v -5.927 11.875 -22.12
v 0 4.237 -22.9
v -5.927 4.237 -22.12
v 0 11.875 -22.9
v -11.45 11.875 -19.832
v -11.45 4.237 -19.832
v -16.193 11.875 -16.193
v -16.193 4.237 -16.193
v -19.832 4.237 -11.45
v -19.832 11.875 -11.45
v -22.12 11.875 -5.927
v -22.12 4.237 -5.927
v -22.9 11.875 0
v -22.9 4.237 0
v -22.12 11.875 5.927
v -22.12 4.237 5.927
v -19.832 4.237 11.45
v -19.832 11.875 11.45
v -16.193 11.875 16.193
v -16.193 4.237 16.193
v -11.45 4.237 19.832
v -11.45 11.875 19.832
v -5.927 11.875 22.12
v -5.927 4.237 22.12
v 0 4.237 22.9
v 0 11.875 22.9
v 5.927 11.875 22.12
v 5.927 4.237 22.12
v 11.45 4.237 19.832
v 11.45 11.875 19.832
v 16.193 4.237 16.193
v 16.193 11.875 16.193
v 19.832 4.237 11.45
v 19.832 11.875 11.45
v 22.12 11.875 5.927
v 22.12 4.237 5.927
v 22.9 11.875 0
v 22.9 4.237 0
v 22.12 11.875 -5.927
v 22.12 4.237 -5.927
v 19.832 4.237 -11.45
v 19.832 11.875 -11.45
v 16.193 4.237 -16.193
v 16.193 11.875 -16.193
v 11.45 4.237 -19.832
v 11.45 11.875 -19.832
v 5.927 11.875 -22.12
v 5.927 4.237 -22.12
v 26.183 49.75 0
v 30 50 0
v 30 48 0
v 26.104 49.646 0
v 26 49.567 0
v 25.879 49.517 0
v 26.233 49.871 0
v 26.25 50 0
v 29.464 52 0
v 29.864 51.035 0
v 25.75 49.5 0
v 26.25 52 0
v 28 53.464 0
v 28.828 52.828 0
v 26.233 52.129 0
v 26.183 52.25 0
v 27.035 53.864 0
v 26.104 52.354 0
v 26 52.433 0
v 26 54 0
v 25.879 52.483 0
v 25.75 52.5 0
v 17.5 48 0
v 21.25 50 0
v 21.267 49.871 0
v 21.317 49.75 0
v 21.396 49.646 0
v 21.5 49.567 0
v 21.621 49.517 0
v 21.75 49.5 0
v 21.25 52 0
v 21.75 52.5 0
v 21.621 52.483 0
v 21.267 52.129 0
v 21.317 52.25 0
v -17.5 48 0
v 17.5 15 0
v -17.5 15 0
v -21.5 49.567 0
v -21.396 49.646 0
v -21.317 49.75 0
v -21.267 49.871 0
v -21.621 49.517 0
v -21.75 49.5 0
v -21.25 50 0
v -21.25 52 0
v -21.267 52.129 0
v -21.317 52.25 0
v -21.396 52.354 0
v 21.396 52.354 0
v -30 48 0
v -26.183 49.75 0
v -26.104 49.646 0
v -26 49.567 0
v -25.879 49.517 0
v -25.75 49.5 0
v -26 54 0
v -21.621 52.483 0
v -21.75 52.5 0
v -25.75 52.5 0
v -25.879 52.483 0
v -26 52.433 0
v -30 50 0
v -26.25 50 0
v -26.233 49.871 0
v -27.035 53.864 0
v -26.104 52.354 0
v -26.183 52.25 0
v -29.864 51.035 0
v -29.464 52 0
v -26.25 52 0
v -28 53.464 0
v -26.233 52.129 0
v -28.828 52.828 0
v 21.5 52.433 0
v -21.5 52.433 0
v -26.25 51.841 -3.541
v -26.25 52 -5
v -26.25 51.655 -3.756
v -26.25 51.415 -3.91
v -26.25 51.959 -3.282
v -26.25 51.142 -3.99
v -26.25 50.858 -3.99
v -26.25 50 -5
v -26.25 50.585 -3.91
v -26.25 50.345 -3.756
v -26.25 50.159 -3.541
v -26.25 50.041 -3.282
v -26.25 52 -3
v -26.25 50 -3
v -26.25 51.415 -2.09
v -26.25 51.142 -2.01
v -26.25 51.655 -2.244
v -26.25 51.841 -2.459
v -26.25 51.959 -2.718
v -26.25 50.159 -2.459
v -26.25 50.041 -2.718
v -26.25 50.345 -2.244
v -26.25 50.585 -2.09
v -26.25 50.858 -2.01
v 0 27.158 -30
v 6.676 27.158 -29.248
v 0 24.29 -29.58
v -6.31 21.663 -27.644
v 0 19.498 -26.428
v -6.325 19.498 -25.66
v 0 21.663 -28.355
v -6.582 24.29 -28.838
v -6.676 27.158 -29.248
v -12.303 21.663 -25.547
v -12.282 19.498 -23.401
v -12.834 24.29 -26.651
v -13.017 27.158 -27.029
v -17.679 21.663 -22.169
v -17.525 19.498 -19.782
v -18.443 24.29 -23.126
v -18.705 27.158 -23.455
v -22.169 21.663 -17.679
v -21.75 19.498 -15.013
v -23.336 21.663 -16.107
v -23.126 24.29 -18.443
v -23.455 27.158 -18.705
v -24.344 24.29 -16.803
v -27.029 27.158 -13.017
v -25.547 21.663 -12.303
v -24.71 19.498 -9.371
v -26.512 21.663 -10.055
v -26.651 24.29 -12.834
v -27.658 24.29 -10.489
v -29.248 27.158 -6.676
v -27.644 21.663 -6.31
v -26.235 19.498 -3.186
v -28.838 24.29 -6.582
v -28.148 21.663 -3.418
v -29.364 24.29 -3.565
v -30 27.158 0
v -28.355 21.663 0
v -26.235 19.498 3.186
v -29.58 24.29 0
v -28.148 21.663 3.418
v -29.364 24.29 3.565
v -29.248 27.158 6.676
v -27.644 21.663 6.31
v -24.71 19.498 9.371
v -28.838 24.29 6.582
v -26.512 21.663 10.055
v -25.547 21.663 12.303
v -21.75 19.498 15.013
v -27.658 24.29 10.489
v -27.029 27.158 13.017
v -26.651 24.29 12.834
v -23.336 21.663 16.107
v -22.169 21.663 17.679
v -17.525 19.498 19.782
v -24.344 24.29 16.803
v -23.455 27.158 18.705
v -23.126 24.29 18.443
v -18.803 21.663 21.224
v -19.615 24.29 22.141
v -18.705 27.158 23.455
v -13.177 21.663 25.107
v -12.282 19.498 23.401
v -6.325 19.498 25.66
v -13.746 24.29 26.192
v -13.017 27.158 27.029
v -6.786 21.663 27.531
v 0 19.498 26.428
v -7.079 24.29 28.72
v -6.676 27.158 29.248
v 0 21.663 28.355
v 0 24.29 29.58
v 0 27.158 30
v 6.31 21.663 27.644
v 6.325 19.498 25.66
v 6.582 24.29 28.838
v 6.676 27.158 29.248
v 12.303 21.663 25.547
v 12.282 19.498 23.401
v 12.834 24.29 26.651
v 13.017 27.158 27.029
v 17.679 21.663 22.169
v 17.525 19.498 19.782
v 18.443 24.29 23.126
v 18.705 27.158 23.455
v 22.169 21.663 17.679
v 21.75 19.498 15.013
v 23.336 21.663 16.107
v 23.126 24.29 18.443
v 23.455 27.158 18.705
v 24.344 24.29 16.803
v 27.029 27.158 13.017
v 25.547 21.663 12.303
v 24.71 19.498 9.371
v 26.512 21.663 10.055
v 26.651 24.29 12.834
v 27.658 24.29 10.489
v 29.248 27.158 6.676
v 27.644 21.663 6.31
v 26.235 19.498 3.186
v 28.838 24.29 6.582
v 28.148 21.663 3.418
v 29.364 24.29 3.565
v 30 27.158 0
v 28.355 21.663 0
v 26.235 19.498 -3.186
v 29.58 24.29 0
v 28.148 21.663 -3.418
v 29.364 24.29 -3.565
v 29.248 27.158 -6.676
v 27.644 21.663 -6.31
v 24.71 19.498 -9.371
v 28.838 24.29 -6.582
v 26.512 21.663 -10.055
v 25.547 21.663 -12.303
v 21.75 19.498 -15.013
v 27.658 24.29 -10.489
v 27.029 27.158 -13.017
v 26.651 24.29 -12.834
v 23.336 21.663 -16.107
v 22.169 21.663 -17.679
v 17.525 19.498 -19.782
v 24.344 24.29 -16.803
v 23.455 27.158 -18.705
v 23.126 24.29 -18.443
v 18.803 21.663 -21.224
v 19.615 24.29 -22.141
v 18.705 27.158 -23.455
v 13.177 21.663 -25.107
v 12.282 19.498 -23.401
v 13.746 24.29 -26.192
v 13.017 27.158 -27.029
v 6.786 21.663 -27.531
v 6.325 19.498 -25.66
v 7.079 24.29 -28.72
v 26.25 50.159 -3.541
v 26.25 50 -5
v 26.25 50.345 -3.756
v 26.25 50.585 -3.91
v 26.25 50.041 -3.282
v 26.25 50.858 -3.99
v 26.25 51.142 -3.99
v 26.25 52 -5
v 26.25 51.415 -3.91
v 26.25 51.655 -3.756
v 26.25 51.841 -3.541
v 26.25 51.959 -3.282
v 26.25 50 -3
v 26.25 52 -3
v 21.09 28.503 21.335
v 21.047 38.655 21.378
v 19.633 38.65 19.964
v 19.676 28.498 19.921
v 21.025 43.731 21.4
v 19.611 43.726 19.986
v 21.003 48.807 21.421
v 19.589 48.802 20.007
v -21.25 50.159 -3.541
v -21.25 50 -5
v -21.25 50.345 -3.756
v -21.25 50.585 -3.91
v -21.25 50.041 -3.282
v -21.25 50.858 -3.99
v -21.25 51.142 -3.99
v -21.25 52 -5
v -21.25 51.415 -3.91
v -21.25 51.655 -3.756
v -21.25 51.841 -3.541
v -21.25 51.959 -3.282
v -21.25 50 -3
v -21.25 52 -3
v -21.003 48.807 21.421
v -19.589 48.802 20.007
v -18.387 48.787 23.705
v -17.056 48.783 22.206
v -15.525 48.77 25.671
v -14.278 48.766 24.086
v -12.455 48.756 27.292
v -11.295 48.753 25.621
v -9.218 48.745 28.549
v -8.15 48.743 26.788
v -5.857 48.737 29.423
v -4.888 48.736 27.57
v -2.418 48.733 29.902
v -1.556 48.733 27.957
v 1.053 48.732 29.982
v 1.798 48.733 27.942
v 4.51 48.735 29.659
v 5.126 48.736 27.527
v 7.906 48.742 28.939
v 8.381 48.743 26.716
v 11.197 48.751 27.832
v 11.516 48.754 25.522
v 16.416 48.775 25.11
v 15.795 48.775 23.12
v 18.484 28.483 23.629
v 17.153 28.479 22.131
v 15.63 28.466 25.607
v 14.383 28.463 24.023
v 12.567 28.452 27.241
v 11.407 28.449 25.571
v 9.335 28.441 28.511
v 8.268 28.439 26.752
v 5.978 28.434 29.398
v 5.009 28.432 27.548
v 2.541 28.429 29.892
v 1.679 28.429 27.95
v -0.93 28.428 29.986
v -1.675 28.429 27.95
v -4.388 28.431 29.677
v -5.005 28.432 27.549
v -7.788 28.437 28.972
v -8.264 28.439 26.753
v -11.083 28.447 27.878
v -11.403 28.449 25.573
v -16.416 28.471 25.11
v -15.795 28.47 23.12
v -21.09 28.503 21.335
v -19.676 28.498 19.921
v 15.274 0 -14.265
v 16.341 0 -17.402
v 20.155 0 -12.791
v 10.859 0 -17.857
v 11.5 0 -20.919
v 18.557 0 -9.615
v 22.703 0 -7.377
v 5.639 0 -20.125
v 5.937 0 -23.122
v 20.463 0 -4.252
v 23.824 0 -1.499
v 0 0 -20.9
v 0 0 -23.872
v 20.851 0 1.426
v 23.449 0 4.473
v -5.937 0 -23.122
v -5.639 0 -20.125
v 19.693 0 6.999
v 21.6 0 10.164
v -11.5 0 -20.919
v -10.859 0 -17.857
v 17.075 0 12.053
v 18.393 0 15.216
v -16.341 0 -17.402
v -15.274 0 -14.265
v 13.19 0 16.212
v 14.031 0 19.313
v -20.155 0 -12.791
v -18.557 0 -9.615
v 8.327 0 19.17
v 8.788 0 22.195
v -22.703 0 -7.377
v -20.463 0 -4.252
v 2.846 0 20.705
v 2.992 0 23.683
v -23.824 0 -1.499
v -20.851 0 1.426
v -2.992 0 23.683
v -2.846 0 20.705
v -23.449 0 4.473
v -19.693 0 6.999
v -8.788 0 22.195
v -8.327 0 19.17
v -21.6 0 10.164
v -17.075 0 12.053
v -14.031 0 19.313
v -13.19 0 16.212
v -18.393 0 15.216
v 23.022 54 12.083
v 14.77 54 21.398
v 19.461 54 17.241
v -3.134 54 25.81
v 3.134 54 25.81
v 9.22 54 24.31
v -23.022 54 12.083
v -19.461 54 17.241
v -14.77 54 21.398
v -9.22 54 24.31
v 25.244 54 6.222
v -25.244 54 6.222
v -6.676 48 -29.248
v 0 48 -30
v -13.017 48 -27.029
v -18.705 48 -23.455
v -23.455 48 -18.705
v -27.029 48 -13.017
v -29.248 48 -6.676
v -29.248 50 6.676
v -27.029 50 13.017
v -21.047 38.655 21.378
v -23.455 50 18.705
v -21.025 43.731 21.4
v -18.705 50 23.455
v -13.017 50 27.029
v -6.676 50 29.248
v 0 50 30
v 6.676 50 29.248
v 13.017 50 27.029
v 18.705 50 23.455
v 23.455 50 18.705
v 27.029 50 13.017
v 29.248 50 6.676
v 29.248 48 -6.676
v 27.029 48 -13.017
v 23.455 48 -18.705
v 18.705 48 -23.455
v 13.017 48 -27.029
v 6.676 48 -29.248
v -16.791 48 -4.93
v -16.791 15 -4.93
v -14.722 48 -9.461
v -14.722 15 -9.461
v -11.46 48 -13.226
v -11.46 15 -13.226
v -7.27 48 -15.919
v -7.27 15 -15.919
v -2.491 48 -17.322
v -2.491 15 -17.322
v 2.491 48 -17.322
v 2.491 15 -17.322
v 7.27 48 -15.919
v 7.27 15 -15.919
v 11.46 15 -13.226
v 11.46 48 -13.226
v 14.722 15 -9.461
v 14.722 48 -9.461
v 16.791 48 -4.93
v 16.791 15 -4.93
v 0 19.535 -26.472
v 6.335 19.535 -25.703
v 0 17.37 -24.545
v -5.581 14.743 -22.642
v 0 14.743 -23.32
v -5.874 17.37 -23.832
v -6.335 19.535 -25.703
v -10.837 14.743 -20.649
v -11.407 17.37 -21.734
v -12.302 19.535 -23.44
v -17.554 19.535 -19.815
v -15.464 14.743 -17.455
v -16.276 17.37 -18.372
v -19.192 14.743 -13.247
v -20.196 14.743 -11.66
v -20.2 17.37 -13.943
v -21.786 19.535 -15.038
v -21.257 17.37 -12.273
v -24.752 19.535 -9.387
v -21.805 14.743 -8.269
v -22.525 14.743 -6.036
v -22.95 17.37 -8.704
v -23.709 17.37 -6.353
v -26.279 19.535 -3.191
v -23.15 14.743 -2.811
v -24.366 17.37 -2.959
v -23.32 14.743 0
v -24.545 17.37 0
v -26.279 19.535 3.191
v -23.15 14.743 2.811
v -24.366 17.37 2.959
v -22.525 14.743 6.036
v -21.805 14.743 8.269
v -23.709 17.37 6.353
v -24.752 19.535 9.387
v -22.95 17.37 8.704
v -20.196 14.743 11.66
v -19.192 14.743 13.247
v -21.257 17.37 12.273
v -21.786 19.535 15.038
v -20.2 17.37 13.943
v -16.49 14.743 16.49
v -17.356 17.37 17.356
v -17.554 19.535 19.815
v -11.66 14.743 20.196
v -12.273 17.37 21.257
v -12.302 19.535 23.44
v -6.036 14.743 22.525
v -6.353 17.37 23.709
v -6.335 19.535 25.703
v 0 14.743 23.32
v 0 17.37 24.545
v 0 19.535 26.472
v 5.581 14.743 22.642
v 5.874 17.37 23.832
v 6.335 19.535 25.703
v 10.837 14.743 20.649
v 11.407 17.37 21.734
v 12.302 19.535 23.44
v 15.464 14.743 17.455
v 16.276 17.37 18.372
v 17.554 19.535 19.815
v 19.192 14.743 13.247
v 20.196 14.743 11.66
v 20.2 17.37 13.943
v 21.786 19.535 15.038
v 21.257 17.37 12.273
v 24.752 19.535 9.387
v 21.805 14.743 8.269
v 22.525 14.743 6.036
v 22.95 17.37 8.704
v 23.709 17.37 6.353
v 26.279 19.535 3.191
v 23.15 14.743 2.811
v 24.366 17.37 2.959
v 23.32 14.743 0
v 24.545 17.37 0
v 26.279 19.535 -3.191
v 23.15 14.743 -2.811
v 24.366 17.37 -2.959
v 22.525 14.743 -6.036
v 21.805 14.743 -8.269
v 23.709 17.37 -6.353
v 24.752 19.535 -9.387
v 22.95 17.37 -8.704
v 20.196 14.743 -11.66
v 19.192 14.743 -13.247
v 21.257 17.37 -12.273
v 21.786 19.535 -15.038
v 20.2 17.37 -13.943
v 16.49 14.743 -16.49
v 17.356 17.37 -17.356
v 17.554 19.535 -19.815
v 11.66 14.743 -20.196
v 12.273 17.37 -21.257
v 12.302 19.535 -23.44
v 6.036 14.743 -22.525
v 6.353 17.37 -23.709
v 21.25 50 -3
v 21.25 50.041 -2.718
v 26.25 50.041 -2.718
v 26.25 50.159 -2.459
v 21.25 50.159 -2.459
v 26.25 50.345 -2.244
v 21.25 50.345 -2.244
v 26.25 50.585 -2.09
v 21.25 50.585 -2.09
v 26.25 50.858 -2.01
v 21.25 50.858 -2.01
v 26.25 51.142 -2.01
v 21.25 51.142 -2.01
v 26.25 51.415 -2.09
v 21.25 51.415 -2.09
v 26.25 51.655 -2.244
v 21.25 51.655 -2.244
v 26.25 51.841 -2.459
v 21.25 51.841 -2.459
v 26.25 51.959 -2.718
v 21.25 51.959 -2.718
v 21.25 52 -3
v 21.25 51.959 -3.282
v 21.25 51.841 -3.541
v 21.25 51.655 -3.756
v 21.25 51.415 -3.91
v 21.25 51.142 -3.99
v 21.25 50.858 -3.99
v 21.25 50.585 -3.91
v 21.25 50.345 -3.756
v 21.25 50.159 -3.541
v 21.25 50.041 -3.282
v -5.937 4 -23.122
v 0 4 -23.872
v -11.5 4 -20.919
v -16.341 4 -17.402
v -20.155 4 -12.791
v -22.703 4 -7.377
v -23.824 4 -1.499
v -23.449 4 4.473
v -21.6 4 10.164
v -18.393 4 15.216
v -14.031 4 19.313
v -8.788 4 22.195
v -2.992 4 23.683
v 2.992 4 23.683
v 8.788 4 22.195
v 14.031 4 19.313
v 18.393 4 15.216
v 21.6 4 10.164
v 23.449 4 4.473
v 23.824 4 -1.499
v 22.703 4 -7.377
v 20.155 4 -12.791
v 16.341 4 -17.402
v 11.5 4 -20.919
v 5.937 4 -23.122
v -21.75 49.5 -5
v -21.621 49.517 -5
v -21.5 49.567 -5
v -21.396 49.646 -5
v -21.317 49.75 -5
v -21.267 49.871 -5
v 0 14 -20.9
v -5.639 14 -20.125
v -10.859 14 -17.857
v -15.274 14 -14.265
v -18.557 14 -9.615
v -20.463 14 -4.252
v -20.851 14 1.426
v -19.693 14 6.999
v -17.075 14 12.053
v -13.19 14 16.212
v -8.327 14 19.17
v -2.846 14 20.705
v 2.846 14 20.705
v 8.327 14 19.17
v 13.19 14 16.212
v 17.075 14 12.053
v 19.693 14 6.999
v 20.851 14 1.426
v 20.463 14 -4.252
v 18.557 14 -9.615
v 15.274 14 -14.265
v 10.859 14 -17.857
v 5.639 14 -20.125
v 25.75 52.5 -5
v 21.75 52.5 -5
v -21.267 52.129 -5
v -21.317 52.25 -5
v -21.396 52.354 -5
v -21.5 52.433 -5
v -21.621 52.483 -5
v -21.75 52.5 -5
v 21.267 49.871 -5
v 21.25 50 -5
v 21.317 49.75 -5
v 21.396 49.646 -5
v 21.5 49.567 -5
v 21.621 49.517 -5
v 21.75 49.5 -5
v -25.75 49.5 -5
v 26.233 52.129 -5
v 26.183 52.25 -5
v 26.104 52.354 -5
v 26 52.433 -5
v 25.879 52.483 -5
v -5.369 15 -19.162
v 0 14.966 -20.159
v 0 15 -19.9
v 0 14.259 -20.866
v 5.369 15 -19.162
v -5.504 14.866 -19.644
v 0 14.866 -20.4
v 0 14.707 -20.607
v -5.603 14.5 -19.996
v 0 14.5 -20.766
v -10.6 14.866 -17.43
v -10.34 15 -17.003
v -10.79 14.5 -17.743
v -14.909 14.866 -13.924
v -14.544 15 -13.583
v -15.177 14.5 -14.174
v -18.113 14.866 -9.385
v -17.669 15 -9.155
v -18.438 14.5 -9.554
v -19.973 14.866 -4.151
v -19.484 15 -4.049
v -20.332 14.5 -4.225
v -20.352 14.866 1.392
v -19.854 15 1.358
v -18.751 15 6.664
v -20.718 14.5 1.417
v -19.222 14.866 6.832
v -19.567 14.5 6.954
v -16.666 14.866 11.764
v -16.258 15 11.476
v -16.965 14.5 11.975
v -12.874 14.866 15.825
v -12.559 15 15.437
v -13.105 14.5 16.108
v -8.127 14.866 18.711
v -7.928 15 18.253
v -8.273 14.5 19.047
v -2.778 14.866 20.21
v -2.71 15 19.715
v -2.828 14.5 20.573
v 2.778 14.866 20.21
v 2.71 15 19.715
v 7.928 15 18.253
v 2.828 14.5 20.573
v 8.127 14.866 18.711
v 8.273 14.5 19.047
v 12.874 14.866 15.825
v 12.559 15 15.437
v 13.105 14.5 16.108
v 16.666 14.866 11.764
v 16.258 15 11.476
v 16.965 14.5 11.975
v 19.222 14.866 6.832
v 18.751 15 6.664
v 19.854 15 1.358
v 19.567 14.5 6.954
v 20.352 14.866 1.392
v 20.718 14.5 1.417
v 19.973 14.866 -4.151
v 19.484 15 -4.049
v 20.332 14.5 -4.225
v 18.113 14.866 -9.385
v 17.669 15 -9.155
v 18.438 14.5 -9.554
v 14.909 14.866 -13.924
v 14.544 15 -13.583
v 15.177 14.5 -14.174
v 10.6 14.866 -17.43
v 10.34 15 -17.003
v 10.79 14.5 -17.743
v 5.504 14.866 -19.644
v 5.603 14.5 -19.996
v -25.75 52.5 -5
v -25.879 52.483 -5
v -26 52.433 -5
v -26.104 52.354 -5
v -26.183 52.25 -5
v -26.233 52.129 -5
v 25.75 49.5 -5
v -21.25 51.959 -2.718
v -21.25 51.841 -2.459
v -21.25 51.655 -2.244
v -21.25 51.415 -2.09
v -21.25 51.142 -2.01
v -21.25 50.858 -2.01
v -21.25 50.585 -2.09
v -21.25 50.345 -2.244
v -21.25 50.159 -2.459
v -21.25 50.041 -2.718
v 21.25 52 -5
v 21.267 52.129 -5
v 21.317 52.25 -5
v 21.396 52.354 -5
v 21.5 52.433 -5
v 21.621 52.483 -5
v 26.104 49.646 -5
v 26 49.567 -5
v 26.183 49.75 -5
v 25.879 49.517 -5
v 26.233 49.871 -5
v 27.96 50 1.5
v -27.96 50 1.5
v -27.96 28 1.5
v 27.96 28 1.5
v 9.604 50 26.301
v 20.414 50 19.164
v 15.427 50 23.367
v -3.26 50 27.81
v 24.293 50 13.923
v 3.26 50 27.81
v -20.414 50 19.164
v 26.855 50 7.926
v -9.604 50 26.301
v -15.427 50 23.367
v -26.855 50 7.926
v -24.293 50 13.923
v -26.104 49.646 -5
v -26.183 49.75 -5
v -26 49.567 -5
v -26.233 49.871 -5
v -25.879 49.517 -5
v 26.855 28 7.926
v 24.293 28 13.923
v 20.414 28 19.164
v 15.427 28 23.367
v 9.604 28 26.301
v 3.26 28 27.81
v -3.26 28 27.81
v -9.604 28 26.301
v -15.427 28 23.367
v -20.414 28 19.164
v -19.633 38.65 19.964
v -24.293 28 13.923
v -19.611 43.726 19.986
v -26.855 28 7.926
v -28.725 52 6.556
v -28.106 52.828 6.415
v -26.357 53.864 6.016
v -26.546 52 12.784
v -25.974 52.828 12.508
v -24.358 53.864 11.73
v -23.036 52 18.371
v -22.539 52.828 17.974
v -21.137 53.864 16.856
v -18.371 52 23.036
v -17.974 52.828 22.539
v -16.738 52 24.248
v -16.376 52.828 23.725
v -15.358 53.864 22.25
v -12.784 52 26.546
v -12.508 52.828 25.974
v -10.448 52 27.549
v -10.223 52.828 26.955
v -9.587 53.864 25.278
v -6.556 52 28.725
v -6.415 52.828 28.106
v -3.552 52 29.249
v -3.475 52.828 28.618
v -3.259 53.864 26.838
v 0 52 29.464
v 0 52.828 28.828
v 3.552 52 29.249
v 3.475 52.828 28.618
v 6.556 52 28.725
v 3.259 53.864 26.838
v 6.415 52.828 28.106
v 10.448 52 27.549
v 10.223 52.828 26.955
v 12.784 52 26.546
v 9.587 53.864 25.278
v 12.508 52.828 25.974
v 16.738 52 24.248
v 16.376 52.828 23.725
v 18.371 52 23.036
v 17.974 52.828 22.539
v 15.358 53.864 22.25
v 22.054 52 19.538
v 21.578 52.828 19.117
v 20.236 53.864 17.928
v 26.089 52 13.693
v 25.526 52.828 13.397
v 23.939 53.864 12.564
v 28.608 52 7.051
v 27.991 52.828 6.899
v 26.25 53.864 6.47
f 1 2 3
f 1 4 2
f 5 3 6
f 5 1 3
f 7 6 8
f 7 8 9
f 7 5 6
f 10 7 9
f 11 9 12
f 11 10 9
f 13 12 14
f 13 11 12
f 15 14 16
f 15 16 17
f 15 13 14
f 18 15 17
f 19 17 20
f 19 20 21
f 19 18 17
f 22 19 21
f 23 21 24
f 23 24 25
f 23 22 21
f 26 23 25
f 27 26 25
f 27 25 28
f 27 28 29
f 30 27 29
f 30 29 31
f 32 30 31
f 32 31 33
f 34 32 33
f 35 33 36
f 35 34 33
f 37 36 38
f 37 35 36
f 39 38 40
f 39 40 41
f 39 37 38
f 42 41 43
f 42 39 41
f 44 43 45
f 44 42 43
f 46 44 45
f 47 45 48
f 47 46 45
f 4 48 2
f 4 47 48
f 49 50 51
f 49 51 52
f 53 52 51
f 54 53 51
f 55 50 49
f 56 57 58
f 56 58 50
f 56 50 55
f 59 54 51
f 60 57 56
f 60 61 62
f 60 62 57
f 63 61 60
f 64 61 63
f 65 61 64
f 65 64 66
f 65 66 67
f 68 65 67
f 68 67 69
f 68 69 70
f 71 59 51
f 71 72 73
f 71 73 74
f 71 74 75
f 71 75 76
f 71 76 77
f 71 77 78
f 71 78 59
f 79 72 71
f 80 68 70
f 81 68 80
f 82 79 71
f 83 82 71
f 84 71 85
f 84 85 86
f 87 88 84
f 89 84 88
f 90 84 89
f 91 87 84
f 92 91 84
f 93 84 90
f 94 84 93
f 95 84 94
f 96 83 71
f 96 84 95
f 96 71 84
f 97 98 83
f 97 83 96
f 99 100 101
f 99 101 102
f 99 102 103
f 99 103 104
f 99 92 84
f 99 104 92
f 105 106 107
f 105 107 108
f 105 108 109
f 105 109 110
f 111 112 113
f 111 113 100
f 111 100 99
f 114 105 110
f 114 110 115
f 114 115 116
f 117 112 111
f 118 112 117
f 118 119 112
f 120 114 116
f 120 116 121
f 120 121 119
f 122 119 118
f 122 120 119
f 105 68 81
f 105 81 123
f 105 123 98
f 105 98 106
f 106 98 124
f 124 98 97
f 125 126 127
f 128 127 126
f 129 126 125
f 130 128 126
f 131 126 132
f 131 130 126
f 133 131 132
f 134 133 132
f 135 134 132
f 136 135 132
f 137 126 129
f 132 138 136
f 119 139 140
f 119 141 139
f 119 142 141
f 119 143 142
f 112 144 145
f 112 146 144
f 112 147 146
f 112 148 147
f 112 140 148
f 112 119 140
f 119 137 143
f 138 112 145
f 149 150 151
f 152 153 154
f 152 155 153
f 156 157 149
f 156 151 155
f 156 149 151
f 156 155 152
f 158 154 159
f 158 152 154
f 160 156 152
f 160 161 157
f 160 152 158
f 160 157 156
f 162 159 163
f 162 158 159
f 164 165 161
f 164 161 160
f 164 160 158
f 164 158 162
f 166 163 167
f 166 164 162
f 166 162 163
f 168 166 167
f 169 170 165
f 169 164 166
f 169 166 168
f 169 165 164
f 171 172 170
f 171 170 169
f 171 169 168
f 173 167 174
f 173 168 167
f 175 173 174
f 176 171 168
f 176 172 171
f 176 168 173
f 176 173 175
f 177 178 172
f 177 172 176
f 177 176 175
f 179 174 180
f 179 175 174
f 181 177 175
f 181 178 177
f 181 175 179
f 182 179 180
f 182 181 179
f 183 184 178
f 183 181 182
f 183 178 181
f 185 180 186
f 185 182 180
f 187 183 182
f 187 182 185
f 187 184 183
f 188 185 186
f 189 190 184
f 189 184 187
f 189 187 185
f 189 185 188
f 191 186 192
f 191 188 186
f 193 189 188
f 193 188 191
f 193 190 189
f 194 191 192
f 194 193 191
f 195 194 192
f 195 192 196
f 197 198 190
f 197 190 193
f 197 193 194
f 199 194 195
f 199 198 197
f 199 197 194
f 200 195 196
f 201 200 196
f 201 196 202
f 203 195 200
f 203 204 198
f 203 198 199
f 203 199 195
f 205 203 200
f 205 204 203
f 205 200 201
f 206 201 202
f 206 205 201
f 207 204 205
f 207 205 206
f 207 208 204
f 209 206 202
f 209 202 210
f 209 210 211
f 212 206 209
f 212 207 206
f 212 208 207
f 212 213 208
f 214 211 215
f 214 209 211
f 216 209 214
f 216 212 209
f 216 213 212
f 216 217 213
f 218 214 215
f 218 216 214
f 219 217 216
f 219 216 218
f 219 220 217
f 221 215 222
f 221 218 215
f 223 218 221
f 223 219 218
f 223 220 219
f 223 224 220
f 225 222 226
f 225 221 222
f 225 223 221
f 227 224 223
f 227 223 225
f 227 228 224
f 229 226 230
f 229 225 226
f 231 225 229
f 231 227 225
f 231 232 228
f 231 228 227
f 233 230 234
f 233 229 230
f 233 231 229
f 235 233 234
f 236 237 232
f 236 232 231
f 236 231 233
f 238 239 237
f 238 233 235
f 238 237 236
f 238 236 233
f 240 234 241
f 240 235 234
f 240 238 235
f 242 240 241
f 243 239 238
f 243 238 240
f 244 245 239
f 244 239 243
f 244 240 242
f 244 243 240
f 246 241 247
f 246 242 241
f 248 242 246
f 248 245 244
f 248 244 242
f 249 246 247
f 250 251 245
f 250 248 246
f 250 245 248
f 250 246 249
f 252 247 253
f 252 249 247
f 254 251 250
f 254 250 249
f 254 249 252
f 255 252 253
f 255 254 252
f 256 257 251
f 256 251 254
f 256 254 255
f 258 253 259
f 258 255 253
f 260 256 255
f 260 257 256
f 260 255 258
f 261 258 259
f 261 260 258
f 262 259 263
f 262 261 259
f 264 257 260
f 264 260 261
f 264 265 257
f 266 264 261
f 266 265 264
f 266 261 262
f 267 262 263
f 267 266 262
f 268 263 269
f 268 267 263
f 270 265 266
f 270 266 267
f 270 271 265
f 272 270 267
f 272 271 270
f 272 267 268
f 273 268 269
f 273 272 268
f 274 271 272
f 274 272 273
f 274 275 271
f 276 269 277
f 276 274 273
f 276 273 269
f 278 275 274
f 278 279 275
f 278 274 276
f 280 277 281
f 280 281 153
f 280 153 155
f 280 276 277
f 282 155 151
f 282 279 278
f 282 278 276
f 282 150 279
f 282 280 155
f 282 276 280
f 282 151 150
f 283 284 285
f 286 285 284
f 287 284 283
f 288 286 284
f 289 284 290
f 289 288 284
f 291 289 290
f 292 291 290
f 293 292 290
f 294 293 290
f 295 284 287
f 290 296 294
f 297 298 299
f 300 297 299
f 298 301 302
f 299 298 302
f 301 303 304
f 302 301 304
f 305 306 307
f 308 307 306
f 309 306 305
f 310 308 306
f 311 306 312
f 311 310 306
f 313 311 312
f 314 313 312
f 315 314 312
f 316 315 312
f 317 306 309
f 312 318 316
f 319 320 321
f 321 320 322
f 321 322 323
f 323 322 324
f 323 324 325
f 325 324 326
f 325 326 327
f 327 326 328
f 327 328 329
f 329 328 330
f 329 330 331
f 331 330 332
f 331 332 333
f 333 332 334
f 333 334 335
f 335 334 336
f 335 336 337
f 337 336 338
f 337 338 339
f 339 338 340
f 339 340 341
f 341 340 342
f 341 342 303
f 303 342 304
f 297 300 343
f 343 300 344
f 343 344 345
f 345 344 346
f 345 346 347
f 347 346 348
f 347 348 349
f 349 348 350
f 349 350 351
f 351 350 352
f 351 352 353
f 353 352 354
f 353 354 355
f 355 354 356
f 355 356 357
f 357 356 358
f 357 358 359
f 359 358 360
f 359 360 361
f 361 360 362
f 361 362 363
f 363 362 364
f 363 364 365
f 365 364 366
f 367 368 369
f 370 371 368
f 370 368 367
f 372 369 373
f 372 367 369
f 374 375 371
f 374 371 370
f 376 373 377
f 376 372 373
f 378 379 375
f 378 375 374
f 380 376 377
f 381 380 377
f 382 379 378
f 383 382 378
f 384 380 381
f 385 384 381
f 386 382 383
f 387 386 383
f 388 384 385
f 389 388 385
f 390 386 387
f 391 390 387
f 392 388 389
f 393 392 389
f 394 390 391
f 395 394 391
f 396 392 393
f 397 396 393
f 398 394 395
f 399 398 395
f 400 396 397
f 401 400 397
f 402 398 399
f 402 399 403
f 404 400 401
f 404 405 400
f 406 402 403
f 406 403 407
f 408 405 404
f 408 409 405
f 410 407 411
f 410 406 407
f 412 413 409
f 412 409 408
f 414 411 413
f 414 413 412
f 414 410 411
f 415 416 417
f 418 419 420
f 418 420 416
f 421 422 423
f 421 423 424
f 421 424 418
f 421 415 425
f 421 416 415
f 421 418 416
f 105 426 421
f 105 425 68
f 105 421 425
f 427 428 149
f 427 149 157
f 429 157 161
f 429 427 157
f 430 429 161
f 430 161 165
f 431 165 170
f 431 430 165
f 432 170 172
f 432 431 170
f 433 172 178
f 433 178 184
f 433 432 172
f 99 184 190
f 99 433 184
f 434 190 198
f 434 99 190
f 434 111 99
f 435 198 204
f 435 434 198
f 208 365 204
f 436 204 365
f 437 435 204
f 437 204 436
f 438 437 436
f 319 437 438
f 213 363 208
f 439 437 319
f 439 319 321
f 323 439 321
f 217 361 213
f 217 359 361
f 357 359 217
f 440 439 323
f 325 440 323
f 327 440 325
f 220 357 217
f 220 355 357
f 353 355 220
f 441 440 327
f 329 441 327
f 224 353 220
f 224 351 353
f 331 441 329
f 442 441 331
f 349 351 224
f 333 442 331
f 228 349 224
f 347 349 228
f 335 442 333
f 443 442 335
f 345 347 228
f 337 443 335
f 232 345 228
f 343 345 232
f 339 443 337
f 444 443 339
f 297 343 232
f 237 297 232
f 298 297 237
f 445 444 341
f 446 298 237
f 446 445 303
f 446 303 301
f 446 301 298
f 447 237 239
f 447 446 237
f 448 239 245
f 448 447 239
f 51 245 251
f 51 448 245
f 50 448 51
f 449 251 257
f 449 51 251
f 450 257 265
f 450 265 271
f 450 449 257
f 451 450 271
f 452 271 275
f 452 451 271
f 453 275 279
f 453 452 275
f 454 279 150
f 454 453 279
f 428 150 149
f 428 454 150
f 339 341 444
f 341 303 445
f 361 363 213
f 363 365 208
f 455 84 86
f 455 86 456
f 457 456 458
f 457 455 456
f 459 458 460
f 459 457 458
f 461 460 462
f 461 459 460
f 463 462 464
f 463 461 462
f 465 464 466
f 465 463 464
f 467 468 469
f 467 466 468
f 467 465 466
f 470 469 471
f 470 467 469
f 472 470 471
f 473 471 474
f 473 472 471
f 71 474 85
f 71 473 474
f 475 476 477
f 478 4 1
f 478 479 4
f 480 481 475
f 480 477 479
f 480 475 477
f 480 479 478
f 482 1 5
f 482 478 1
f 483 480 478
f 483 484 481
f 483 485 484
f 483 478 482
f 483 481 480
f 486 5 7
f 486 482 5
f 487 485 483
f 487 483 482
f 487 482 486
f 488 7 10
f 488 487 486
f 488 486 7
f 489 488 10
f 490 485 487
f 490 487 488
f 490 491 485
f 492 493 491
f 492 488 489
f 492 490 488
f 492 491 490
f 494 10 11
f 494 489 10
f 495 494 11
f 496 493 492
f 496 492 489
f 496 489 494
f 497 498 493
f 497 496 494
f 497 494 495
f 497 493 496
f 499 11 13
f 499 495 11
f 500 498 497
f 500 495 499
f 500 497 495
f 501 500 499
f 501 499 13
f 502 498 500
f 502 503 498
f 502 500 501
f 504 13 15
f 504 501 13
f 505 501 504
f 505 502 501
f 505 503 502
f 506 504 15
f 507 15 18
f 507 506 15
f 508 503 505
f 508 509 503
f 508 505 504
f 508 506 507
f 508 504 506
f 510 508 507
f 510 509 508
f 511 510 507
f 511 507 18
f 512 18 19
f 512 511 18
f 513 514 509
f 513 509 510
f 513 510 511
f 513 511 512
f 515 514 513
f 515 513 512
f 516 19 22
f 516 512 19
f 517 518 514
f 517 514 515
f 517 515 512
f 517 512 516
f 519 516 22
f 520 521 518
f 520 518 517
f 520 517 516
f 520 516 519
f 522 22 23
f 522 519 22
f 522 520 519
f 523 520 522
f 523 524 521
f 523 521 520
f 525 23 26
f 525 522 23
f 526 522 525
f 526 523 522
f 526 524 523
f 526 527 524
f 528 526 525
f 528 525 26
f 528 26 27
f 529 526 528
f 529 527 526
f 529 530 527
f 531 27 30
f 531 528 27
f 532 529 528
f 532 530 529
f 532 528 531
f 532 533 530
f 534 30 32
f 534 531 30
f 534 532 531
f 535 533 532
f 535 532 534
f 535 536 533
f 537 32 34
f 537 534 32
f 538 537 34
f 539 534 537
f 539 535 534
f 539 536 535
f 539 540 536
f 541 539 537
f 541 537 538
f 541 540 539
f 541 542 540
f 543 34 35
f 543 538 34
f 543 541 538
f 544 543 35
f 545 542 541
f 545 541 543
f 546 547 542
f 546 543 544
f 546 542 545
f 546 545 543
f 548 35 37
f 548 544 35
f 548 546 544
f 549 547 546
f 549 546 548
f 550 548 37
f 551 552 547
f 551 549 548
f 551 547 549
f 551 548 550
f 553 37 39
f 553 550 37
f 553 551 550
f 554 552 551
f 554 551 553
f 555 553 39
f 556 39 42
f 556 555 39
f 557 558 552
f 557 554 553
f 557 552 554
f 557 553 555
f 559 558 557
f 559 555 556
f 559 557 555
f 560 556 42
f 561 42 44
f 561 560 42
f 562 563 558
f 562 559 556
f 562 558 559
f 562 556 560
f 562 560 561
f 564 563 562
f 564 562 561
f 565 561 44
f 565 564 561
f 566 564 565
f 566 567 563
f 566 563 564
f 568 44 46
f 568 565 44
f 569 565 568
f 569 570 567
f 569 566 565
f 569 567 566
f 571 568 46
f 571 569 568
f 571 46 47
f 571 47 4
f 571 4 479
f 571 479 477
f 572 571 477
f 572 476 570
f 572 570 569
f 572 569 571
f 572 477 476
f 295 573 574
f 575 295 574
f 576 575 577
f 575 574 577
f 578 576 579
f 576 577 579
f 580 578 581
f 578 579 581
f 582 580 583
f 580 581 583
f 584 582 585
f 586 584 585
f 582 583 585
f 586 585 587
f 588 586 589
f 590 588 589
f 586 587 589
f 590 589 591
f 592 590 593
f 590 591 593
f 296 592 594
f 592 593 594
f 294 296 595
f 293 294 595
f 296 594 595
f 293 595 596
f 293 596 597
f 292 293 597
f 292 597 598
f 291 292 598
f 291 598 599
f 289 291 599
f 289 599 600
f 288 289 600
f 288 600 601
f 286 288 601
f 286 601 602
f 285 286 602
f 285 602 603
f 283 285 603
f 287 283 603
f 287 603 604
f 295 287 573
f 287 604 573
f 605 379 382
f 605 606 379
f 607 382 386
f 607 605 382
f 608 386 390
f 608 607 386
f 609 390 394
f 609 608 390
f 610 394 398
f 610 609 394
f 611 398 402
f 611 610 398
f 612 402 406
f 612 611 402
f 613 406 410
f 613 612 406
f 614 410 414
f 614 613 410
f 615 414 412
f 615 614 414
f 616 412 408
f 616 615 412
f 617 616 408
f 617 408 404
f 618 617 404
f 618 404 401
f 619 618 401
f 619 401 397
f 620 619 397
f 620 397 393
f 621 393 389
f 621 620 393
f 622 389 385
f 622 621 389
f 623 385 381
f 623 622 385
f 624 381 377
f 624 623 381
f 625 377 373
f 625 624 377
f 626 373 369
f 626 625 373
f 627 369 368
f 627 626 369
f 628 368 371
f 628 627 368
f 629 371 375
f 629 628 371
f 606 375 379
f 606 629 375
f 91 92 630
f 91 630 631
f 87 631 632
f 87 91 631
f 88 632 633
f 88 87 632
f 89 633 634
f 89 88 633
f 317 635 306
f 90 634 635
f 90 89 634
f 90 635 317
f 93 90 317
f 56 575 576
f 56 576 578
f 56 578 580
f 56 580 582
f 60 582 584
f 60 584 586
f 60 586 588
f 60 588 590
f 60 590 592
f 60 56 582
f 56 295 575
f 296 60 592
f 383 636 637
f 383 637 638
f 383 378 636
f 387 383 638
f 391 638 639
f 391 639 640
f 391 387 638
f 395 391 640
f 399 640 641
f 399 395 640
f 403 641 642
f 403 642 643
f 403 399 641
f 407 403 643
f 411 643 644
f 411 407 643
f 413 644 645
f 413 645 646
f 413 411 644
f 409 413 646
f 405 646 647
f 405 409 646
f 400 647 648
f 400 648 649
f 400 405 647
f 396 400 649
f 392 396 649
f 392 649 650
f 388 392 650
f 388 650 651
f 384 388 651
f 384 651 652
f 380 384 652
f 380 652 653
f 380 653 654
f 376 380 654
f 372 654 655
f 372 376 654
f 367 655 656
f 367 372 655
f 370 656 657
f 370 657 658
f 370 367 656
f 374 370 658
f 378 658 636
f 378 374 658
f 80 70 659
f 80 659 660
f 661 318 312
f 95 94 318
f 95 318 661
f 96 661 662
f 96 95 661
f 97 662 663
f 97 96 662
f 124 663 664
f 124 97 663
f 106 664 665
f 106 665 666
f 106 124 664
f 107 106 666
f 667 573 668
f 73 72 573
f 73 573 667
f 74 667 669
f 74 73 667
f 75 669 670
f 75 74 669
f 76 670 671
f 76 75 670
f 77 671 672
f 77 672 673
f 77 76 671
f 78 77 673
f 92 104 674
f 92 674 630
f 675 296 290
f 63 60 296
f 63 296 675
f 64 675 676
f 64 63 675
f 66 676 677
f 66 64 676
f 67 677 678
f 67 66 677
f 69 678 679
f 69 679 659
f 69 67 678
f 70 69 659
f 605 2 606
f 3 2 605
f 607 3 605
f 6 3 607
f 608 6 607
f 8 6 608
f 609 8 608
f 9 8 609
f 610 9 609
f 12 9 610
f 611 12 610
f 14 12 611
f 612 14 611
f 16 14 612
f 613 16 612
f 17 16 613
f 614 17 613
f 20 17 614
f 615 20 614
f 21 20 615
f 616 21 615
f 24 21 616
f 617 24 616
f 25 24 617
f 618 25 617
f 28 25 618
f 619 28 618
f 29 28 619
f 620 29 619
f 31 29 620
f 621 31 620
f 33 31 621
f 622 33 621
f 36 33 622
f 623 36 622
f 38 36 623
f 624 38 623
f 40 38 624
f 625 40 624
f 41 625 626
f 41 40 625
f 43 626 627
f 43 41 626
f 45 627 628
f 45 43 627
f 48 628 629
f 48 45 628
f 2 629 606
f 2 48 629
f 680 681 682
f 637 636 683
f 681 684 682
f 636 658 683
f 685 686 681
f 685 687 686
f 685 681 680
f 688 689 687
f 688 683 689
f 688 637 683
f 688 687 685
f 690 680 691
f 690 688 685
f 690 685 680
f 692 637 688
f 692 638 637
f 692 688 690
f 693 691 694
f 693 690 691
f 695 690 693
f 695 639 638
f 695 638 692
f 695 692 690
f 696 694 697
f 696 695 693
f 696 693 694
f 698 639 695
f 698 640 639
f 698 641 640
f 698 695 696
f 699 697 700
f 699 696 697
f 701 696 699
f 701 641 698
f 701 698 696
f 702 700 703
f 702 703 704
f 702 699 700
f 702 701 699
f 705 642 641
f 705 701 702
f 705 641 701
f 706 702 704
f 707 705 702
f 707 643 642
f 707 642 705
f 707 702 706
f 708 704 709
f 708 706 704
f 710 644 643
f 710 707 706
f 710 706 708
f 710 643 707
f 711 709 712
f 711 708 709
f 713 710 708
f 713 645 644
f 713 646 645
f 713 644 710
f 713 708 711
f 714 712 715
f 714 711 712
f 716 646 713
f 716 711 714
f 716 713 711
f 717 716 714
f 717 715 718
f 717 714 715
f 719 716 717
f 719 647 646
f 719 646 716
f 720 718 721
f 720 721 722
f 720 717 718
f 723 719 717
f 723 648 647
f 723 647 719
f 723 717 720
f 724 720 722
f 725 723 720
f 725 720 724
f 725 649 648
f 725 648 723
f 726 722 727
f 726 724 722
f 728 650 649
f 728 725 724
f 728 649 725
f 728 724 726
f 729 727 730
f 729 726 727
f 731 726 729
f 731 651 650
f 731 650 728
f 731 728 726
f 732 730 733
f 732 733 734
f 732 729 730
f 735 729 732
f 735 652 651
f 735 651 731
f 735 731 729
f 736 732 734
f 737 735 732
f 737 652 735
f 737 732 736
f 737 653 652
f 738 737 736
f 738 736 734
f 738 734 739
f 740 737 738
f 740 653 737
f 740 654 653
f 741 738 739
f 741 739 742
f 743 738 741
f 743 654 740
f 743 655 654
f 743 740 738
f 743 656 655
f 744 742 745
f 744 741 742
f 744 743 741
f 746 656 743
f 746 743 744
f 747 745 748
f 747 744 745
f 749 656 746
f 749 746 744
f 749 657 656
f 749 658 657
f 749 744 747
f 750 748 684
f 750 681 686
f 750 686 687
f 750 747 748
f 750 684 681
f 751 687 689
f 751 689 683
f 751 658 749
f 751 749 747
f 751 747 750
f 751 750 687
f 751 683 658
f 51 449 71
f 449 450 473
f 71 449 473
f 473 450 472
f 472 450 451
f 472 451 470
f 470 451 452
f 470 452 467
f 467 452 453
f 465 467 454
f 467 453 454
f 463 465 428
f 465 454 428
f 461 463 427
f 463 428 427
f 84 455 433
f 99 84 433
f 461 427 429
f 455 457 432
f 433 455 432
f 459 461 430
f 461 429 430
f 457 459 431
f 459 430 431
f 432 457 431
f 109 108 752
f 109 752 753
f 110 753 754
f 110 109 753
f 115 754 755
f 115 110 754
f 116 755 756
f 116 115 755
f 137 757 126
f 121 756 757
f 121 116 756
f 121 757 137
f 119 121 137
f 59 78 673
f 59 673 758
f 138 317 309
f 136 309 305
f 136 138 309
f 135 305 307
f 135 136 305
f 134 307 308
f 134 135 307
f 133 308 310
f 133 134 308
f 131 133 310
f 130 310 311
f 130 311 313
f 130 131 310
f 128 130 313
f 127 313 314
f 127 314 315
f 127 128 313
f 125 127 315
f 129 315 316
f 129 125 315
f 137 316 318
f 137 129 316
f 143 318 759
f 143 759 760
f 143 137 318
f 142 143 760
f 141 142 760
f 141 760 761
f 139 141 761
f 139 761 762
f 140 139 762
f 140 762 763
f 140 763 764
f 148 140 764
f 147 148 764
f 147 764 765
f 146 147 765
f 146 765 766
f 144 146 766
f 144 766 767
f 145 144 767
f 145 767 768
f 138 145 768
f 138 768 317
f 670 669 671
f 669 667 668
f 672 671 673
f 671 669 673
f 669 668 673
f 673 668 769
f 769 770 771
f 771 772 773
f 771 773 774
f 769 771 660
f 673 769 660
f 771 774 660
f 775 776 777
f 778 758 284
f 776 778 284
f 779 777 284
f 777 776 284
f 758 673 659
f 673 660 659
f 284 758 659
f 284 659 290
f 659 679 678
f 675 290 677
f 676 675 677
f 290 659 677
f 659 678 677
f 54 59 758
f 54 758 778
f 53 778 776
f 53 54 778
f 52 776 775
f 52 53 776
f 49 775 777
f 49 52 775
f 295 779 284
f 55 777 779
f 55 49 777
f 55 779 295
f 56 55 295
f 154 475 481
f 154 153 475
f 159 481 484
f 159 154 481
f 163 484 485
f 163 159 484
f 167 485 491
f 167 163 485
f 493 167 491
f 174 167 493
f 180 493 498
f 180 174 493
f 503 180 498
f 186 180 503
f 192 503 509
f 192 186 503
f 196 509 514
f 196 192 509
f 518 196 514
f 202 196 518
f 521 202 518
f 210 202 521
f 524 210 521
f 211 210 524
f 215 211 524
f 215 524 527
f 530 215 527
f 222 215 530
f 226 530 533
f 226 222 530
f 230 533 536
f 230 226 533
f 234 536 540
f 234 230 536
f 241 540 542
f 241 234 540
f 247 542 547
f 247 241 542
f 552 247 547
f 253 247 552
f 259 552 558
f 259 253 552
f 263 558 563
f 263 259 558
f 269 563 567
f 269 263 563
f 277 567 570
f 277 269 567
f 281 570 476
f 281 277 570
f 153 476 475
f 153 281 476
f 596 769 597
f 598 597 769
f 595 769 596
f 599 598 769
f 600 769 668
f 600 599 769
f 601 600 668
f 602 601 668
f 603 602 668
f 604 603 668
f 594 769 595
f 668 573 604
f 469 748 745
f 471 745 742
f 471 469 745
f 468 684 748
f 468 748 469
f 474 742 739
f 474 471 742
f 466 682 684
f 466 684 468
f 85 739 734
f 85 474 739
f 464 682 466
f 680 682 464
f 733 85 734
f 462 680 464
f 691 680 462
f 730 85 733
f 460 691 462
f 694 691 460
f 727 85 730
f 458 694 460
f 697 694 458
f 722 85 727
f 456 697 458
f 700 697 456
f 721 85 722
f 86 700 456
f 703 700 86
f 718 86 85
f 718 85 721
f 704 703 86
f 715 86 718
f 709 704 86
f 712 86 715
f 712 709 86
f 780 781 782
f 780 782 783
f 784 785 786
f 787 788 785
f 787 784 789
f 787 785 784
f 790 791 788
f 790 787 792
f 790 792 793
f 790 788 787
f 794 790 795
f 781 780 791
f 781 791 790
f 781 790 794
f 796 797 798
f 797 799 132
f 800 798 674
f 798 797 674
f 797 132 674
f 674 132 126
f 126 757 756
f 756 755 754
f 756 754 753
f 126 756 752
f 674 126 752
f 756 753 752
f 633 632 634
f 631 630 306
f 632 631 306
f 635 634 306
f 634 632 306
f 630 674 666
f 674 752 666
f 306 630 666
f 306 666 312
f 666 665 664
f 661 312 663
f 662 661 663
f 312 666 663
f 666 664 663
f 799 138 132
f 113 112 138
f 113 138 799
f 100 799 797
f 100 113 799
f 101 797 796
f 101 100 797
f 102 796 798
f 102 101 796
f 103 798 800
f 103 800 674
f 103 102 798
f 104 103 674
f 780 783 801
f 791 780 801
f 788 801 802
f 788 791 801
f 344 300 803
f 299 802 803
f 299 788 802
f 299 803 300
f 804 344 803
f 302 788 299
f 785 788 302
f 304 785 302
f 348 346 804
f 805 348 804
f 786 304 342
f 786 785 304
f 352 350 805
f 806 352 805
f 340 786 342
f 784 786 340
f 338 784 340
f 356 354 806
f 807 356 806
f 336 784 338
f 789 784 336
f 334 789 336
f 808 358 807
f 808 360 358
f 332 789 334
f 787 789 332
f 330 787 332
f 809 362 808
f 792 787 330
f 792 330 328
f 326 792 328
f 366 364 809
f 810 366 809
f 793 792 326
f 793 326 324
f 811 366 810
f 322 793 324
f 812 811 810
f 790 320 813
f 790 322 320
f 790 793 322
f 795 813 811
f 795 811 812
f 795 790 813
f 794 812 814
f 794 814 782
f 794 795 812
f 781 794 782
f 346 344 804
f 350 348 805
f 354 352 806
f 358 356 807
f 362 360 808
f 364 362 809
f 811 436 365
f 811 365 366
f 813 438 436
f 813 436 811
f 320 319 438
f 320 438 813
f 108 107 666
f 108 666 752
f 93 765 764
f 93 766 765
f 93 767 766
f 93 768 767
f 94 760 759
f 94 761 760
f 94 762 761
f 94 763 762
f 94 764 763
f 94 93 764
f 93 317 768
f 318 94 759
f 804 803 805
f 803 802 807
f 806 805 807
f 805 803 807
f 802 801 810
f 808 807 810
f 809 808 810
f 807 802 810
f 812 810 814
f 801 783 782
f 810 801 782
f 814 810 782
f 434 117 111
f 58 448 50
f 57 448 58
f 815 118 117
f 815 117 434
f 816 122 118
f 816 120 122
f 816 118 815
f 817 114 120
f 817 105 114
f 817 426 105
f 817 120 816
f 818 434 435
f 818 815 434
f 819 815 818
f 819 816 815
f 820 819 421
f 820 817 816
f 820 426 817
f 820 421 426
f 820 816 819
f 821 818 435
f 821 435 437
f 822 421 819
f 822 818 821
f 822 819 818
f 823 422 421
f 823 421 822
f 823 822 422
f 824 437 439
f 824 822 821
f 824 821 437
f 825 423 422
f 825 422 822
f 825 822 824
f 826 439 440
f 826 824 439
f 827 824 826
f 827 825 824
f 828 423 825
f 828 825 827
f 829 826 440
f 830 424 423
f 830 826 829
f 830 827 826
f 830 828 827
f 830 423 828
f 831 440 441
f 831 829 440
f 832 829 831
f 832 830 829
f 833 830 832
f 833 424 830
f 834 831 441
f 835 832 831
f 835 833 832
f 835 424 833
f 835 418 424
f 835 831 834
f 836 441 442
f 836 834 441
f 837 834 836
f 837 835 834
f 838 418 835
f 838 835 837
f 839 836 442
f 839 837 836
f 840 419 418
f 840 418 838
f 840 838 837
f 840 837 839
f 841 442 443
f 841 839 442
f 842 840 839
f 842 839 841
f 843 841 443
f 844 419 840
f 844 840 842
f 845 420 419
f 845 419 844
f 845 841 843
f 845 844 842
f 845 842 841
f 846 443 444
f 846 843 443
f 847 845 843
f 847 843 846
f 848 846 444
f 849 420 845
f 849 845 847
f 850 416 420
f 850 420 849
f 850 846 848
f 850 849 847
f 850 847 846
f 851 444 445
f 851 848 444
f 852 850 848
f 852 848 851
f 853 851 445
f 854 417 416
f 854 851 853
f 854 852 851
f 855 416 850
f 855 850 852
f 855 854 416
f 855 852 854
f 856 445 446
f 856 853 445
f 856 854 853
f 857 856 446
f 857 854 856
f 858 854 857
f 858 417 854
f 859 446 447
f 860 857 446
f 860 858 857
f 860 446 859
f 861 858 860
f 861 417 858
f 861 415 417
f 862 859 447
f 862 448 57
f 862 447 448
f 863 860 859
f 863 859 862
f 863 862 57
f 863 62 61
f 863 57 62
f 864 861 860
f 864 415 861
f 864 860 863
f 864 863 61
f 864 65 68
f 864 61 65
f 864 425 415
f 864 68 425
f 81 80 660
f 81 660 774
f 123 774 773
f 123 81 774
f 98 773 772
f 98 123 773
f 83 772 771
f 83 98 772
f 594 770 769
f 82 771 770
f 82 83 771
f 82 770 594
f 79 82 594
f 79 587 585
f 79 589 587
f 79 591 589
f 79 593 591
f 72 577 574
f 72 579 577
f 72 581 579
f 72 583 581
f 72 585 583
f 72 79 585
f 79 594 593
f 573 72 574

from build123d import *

# Parameters (mm, degrees)
CUT_EXTRUDE3_DEPTH           = 25
CUT_EXTRUDE3_DEPTH_BACK      = 40
CUT_EXTRUDE5_DEPTH           = 2
CUT_EXTRUDE5_DEPTH_BACK      = 5
BOSS_EXTRUDE2_DEPTH          = 5
CUT_EXTRUDE6_DEPTH           = 22
SKETCH17_W                   = 7
SKETCH17_H                   = 20.303986046
CUT_REVOLVE1_ANGLE           = 45
CUT_REVOLVE1_OTHER_WAY_ANGLE = 45
SKETCH14_R                   = 1
CUT_EXTRUDE7_DEPTH           = 10
CUT_EXTRUDE8_START           = -10
SKETCH15_R                   = 1
CUT_EXTRUDE8_DEPTH           = 10


with BuildPart() as part:
    # Sketch1 → Revolve1 (revolve)
    with BuildSketch(Plane.XY, mode=Mode.PRIVATE) as revolve1_sk:
        with BuildLine():
            Line((20.9, 0), (23.871591838, 0))
            Line((23.871591838, 0), (23.871591838, 4))
            Line((23.871591838, 4), (22.9, 4.236662843))
            Line((22.9, 4.236662843), (22.9, 11.874576818))
            ThreePointArc((22.9, 11.874576818), (23.83692213, 16.100759435), (26.472123903, 19.535021249))
            Line((26.472123903, 19.535021249), (26.427876097, 19.497892931))
            ThreePointArc((26.427876097, 19.497892931), (29.06307787, 22.932154745), (30, 27.158337362))
            Line((30, 27.158337362), (30, 50))
            ThreePointArc((30, 50), (28.828427125, 52.828427125), (26, 54))
            Line((26, 54), (0, 54))
            Line((0, 54), (0, 15))
            Line((0, 15), (19.9, 15))
            ThreePointArc((19.9, 15), (20.607106781, 14.707106781), (20.9, 14))
            Line((20.9, 14), (20.9, 0))
        make_face()
    revolve(revolve1_sk.sketch.rotate(Axis((0, 0, 0), (0, 1, 0)), 90), axis=Axis((0, 0, 0), (0, 1, 0)))

    # Sketch11 → Cut-Extrude3 (cut, two sides: drawn at the far end of the back side and taken through both)
    with BuildSketch(Plane(origin=(0, 19.535021249, 0), x_dir=(-1, 0, 0), z_dir=(0, -1, 0)).offset(-CUT_EXTRUDE3_DEPTH_BACK)):
        with BuildLine():
            Line((-17.5, 0), (17.5, 0))
            ThreePointArc((17.5, 0), (0, 17.5), (-17.5, 0))
        make_face()
    extrude(amount=CUT_EXTRUDE3_DEPTH + CUT_EXTRUDE3_DEPTH_BACK, mode=Mode.SUBTRACT)

    # Sketch9 → Cut-Extrude5 (cut, two sides: drawn at the far end of the back side and taken through both)
    with BuildSketch(Plane(origin=(0, 50, 0), x_dir=(-1, 0, 0), z_dir=(0, -1, 0)).offset(-CUT_EXTRUDE5_DEPTH_BACK)):
        with BuildLine():
            Line((-30, 0), (30, 0))
            ThreePointArc((30, 0), (0, 30), (-30, 0))
        make_face()
    extrude(amount=CUT_EXTRUDE5_DEPTH + CUT_EXTRUDE5_DEPTH_BACK, mode=Mode.SUBTRACT)

    # Sketch13 → Boss-Extrude2 (add)
    with BuildSketch(Plane(origin=(0, 0, 0), x_dir=(-1, 0, 0), z_dir=(0, 0, -1))):
        with BuildLine():
            Line((21.75, 52.5), (25.75, 52.5))
            ThreePointArc((25.75, 52.5), (26.103553391, 52.353553391), (26.25, 52))
            Line((26.25, 52), (26.25, 50))
            ThreePointArc((26.25, 50), (26.103553391, 49.646446609), (25.75, 49.5))
            Line((25.75, 49.5), (21.75, 49.5))
            ThreePointArc((21.75, 49.5), (21.396446609, 49.646446609), (21.25, 50))
            Line((21.25, 50), (21.25, 52))
            ThreePointArc((21.25, 52), (21.396446609, 52.353553391), (21.75, 52.5))
        make_face()
        with BuildLine():
            Line((-25.75, 52.5), (-21.75, 52.5))
            ThreePointArc((-21.75, 52.5), (-21.396446609, 52.353553391), (-21.25, 52))
            Line((-21.25, 52), (-21.25, 50))
            ThreePointArc((-21.25, 50), (-21.396446609, 49.646446609), (-21.75, 49.5))
            Line((-21.75, 49.5), (-25.75, 49.5))
            ThreePointArc((-25.75, 49.5), (-26.103553391, 49.646446609), (-26.25, 50))
            Line((-26.25, 50), (-26.25, 52))
            ThreePointArc((-26.25, 52), (-26.103553391, 52.353553391), (-25.75, 52.5))
        make_face()
    extrude(amount=BOSS_EXTRUDE2_DEPTH)

    # Sketch16 → Cut-Extrude6 (cut)
    with BuildSketch(Plane(origin=(0, 50, 0), x_dir=(-1, 0, 0), z_dir=(0, -1, 0))):
        with BuildLine():
            Line((27.95979256, -1.5), (-27.95979256, -1.5))
            ThreePointArc((-27.95979256, -1.5), (0, -28), (27.95979256, -1.5))
        make_face()
    extrude(amount=CUT_EXTRUDE6_DEPTH, mode=Mode.SUBTRACT)

    # Sketch17 → Cut-Revolve1 (revolve, cut)
    with BuildSketch(Plane(origin=(0, 0, 0), x_dir=(0, 0, -1), z_dir=(1, 0, 0))):
        with Locations((-28.883918314, 38.580330385)):
            Rectangle(SKETCH17_W, SKETCH17_H)
    revolve(axis=Axis((0, 0, 0), (0, 0.9999633813881498, 0.008557796607647805)), revolution_arc=CUT_REVOLVE1_ANGLE, mode=Mode.SUBTRACT)

    # Sketch17 → Cut-Revolve1 other way (revolve, cut)
    with BuildSketch(Plane(origin=(0, 0, 0), x_dir=(0, 0, -1), z_dir=(1, 0, 0))):
        with Locations((-28.883918314, 38.580330385)):
            Rectangle(SKETCH17_W, SKETCH17_H)
    revolve(axis=Axis((0, 0, 0), (0, -0.9999633813881498, -0.008557796607647805)), revolution_arc=CUT_REVOLVE1_OTHER_WAY_ANGLE, mode=Mode.SUBTRACT)

    # Sketch14 → Cut-Extrude7 (cut)
    with BuildSketch(Plane.ZY.offset(-21.25)):
        with Locations(Location((-3, 51, 0), (0, 0, 270))):
            Circle(SKETCH14_R)
    extrude(amount=-CUT_EXTRUDE7_DEPTH, mode=Mode.SUBTRACT)

    # Sketch15 → Cut-Extrude8 (cut)
    with BuildSketch(Plane(origin=(-21.25, 0, 0), x_dir=(0, 0, -1), z_dir=(1, 0, 0)).offset(CUT_EXTRUDE8_START)):
        with Locations(Location((3, 51, 0), (0, 0, 270))):
            Circle(SKETCH15_R)
    extrude(amount=CUT_EXTRUDE8_DEPTH, mode=Mode.SUBTRACT)


solid = part.part
